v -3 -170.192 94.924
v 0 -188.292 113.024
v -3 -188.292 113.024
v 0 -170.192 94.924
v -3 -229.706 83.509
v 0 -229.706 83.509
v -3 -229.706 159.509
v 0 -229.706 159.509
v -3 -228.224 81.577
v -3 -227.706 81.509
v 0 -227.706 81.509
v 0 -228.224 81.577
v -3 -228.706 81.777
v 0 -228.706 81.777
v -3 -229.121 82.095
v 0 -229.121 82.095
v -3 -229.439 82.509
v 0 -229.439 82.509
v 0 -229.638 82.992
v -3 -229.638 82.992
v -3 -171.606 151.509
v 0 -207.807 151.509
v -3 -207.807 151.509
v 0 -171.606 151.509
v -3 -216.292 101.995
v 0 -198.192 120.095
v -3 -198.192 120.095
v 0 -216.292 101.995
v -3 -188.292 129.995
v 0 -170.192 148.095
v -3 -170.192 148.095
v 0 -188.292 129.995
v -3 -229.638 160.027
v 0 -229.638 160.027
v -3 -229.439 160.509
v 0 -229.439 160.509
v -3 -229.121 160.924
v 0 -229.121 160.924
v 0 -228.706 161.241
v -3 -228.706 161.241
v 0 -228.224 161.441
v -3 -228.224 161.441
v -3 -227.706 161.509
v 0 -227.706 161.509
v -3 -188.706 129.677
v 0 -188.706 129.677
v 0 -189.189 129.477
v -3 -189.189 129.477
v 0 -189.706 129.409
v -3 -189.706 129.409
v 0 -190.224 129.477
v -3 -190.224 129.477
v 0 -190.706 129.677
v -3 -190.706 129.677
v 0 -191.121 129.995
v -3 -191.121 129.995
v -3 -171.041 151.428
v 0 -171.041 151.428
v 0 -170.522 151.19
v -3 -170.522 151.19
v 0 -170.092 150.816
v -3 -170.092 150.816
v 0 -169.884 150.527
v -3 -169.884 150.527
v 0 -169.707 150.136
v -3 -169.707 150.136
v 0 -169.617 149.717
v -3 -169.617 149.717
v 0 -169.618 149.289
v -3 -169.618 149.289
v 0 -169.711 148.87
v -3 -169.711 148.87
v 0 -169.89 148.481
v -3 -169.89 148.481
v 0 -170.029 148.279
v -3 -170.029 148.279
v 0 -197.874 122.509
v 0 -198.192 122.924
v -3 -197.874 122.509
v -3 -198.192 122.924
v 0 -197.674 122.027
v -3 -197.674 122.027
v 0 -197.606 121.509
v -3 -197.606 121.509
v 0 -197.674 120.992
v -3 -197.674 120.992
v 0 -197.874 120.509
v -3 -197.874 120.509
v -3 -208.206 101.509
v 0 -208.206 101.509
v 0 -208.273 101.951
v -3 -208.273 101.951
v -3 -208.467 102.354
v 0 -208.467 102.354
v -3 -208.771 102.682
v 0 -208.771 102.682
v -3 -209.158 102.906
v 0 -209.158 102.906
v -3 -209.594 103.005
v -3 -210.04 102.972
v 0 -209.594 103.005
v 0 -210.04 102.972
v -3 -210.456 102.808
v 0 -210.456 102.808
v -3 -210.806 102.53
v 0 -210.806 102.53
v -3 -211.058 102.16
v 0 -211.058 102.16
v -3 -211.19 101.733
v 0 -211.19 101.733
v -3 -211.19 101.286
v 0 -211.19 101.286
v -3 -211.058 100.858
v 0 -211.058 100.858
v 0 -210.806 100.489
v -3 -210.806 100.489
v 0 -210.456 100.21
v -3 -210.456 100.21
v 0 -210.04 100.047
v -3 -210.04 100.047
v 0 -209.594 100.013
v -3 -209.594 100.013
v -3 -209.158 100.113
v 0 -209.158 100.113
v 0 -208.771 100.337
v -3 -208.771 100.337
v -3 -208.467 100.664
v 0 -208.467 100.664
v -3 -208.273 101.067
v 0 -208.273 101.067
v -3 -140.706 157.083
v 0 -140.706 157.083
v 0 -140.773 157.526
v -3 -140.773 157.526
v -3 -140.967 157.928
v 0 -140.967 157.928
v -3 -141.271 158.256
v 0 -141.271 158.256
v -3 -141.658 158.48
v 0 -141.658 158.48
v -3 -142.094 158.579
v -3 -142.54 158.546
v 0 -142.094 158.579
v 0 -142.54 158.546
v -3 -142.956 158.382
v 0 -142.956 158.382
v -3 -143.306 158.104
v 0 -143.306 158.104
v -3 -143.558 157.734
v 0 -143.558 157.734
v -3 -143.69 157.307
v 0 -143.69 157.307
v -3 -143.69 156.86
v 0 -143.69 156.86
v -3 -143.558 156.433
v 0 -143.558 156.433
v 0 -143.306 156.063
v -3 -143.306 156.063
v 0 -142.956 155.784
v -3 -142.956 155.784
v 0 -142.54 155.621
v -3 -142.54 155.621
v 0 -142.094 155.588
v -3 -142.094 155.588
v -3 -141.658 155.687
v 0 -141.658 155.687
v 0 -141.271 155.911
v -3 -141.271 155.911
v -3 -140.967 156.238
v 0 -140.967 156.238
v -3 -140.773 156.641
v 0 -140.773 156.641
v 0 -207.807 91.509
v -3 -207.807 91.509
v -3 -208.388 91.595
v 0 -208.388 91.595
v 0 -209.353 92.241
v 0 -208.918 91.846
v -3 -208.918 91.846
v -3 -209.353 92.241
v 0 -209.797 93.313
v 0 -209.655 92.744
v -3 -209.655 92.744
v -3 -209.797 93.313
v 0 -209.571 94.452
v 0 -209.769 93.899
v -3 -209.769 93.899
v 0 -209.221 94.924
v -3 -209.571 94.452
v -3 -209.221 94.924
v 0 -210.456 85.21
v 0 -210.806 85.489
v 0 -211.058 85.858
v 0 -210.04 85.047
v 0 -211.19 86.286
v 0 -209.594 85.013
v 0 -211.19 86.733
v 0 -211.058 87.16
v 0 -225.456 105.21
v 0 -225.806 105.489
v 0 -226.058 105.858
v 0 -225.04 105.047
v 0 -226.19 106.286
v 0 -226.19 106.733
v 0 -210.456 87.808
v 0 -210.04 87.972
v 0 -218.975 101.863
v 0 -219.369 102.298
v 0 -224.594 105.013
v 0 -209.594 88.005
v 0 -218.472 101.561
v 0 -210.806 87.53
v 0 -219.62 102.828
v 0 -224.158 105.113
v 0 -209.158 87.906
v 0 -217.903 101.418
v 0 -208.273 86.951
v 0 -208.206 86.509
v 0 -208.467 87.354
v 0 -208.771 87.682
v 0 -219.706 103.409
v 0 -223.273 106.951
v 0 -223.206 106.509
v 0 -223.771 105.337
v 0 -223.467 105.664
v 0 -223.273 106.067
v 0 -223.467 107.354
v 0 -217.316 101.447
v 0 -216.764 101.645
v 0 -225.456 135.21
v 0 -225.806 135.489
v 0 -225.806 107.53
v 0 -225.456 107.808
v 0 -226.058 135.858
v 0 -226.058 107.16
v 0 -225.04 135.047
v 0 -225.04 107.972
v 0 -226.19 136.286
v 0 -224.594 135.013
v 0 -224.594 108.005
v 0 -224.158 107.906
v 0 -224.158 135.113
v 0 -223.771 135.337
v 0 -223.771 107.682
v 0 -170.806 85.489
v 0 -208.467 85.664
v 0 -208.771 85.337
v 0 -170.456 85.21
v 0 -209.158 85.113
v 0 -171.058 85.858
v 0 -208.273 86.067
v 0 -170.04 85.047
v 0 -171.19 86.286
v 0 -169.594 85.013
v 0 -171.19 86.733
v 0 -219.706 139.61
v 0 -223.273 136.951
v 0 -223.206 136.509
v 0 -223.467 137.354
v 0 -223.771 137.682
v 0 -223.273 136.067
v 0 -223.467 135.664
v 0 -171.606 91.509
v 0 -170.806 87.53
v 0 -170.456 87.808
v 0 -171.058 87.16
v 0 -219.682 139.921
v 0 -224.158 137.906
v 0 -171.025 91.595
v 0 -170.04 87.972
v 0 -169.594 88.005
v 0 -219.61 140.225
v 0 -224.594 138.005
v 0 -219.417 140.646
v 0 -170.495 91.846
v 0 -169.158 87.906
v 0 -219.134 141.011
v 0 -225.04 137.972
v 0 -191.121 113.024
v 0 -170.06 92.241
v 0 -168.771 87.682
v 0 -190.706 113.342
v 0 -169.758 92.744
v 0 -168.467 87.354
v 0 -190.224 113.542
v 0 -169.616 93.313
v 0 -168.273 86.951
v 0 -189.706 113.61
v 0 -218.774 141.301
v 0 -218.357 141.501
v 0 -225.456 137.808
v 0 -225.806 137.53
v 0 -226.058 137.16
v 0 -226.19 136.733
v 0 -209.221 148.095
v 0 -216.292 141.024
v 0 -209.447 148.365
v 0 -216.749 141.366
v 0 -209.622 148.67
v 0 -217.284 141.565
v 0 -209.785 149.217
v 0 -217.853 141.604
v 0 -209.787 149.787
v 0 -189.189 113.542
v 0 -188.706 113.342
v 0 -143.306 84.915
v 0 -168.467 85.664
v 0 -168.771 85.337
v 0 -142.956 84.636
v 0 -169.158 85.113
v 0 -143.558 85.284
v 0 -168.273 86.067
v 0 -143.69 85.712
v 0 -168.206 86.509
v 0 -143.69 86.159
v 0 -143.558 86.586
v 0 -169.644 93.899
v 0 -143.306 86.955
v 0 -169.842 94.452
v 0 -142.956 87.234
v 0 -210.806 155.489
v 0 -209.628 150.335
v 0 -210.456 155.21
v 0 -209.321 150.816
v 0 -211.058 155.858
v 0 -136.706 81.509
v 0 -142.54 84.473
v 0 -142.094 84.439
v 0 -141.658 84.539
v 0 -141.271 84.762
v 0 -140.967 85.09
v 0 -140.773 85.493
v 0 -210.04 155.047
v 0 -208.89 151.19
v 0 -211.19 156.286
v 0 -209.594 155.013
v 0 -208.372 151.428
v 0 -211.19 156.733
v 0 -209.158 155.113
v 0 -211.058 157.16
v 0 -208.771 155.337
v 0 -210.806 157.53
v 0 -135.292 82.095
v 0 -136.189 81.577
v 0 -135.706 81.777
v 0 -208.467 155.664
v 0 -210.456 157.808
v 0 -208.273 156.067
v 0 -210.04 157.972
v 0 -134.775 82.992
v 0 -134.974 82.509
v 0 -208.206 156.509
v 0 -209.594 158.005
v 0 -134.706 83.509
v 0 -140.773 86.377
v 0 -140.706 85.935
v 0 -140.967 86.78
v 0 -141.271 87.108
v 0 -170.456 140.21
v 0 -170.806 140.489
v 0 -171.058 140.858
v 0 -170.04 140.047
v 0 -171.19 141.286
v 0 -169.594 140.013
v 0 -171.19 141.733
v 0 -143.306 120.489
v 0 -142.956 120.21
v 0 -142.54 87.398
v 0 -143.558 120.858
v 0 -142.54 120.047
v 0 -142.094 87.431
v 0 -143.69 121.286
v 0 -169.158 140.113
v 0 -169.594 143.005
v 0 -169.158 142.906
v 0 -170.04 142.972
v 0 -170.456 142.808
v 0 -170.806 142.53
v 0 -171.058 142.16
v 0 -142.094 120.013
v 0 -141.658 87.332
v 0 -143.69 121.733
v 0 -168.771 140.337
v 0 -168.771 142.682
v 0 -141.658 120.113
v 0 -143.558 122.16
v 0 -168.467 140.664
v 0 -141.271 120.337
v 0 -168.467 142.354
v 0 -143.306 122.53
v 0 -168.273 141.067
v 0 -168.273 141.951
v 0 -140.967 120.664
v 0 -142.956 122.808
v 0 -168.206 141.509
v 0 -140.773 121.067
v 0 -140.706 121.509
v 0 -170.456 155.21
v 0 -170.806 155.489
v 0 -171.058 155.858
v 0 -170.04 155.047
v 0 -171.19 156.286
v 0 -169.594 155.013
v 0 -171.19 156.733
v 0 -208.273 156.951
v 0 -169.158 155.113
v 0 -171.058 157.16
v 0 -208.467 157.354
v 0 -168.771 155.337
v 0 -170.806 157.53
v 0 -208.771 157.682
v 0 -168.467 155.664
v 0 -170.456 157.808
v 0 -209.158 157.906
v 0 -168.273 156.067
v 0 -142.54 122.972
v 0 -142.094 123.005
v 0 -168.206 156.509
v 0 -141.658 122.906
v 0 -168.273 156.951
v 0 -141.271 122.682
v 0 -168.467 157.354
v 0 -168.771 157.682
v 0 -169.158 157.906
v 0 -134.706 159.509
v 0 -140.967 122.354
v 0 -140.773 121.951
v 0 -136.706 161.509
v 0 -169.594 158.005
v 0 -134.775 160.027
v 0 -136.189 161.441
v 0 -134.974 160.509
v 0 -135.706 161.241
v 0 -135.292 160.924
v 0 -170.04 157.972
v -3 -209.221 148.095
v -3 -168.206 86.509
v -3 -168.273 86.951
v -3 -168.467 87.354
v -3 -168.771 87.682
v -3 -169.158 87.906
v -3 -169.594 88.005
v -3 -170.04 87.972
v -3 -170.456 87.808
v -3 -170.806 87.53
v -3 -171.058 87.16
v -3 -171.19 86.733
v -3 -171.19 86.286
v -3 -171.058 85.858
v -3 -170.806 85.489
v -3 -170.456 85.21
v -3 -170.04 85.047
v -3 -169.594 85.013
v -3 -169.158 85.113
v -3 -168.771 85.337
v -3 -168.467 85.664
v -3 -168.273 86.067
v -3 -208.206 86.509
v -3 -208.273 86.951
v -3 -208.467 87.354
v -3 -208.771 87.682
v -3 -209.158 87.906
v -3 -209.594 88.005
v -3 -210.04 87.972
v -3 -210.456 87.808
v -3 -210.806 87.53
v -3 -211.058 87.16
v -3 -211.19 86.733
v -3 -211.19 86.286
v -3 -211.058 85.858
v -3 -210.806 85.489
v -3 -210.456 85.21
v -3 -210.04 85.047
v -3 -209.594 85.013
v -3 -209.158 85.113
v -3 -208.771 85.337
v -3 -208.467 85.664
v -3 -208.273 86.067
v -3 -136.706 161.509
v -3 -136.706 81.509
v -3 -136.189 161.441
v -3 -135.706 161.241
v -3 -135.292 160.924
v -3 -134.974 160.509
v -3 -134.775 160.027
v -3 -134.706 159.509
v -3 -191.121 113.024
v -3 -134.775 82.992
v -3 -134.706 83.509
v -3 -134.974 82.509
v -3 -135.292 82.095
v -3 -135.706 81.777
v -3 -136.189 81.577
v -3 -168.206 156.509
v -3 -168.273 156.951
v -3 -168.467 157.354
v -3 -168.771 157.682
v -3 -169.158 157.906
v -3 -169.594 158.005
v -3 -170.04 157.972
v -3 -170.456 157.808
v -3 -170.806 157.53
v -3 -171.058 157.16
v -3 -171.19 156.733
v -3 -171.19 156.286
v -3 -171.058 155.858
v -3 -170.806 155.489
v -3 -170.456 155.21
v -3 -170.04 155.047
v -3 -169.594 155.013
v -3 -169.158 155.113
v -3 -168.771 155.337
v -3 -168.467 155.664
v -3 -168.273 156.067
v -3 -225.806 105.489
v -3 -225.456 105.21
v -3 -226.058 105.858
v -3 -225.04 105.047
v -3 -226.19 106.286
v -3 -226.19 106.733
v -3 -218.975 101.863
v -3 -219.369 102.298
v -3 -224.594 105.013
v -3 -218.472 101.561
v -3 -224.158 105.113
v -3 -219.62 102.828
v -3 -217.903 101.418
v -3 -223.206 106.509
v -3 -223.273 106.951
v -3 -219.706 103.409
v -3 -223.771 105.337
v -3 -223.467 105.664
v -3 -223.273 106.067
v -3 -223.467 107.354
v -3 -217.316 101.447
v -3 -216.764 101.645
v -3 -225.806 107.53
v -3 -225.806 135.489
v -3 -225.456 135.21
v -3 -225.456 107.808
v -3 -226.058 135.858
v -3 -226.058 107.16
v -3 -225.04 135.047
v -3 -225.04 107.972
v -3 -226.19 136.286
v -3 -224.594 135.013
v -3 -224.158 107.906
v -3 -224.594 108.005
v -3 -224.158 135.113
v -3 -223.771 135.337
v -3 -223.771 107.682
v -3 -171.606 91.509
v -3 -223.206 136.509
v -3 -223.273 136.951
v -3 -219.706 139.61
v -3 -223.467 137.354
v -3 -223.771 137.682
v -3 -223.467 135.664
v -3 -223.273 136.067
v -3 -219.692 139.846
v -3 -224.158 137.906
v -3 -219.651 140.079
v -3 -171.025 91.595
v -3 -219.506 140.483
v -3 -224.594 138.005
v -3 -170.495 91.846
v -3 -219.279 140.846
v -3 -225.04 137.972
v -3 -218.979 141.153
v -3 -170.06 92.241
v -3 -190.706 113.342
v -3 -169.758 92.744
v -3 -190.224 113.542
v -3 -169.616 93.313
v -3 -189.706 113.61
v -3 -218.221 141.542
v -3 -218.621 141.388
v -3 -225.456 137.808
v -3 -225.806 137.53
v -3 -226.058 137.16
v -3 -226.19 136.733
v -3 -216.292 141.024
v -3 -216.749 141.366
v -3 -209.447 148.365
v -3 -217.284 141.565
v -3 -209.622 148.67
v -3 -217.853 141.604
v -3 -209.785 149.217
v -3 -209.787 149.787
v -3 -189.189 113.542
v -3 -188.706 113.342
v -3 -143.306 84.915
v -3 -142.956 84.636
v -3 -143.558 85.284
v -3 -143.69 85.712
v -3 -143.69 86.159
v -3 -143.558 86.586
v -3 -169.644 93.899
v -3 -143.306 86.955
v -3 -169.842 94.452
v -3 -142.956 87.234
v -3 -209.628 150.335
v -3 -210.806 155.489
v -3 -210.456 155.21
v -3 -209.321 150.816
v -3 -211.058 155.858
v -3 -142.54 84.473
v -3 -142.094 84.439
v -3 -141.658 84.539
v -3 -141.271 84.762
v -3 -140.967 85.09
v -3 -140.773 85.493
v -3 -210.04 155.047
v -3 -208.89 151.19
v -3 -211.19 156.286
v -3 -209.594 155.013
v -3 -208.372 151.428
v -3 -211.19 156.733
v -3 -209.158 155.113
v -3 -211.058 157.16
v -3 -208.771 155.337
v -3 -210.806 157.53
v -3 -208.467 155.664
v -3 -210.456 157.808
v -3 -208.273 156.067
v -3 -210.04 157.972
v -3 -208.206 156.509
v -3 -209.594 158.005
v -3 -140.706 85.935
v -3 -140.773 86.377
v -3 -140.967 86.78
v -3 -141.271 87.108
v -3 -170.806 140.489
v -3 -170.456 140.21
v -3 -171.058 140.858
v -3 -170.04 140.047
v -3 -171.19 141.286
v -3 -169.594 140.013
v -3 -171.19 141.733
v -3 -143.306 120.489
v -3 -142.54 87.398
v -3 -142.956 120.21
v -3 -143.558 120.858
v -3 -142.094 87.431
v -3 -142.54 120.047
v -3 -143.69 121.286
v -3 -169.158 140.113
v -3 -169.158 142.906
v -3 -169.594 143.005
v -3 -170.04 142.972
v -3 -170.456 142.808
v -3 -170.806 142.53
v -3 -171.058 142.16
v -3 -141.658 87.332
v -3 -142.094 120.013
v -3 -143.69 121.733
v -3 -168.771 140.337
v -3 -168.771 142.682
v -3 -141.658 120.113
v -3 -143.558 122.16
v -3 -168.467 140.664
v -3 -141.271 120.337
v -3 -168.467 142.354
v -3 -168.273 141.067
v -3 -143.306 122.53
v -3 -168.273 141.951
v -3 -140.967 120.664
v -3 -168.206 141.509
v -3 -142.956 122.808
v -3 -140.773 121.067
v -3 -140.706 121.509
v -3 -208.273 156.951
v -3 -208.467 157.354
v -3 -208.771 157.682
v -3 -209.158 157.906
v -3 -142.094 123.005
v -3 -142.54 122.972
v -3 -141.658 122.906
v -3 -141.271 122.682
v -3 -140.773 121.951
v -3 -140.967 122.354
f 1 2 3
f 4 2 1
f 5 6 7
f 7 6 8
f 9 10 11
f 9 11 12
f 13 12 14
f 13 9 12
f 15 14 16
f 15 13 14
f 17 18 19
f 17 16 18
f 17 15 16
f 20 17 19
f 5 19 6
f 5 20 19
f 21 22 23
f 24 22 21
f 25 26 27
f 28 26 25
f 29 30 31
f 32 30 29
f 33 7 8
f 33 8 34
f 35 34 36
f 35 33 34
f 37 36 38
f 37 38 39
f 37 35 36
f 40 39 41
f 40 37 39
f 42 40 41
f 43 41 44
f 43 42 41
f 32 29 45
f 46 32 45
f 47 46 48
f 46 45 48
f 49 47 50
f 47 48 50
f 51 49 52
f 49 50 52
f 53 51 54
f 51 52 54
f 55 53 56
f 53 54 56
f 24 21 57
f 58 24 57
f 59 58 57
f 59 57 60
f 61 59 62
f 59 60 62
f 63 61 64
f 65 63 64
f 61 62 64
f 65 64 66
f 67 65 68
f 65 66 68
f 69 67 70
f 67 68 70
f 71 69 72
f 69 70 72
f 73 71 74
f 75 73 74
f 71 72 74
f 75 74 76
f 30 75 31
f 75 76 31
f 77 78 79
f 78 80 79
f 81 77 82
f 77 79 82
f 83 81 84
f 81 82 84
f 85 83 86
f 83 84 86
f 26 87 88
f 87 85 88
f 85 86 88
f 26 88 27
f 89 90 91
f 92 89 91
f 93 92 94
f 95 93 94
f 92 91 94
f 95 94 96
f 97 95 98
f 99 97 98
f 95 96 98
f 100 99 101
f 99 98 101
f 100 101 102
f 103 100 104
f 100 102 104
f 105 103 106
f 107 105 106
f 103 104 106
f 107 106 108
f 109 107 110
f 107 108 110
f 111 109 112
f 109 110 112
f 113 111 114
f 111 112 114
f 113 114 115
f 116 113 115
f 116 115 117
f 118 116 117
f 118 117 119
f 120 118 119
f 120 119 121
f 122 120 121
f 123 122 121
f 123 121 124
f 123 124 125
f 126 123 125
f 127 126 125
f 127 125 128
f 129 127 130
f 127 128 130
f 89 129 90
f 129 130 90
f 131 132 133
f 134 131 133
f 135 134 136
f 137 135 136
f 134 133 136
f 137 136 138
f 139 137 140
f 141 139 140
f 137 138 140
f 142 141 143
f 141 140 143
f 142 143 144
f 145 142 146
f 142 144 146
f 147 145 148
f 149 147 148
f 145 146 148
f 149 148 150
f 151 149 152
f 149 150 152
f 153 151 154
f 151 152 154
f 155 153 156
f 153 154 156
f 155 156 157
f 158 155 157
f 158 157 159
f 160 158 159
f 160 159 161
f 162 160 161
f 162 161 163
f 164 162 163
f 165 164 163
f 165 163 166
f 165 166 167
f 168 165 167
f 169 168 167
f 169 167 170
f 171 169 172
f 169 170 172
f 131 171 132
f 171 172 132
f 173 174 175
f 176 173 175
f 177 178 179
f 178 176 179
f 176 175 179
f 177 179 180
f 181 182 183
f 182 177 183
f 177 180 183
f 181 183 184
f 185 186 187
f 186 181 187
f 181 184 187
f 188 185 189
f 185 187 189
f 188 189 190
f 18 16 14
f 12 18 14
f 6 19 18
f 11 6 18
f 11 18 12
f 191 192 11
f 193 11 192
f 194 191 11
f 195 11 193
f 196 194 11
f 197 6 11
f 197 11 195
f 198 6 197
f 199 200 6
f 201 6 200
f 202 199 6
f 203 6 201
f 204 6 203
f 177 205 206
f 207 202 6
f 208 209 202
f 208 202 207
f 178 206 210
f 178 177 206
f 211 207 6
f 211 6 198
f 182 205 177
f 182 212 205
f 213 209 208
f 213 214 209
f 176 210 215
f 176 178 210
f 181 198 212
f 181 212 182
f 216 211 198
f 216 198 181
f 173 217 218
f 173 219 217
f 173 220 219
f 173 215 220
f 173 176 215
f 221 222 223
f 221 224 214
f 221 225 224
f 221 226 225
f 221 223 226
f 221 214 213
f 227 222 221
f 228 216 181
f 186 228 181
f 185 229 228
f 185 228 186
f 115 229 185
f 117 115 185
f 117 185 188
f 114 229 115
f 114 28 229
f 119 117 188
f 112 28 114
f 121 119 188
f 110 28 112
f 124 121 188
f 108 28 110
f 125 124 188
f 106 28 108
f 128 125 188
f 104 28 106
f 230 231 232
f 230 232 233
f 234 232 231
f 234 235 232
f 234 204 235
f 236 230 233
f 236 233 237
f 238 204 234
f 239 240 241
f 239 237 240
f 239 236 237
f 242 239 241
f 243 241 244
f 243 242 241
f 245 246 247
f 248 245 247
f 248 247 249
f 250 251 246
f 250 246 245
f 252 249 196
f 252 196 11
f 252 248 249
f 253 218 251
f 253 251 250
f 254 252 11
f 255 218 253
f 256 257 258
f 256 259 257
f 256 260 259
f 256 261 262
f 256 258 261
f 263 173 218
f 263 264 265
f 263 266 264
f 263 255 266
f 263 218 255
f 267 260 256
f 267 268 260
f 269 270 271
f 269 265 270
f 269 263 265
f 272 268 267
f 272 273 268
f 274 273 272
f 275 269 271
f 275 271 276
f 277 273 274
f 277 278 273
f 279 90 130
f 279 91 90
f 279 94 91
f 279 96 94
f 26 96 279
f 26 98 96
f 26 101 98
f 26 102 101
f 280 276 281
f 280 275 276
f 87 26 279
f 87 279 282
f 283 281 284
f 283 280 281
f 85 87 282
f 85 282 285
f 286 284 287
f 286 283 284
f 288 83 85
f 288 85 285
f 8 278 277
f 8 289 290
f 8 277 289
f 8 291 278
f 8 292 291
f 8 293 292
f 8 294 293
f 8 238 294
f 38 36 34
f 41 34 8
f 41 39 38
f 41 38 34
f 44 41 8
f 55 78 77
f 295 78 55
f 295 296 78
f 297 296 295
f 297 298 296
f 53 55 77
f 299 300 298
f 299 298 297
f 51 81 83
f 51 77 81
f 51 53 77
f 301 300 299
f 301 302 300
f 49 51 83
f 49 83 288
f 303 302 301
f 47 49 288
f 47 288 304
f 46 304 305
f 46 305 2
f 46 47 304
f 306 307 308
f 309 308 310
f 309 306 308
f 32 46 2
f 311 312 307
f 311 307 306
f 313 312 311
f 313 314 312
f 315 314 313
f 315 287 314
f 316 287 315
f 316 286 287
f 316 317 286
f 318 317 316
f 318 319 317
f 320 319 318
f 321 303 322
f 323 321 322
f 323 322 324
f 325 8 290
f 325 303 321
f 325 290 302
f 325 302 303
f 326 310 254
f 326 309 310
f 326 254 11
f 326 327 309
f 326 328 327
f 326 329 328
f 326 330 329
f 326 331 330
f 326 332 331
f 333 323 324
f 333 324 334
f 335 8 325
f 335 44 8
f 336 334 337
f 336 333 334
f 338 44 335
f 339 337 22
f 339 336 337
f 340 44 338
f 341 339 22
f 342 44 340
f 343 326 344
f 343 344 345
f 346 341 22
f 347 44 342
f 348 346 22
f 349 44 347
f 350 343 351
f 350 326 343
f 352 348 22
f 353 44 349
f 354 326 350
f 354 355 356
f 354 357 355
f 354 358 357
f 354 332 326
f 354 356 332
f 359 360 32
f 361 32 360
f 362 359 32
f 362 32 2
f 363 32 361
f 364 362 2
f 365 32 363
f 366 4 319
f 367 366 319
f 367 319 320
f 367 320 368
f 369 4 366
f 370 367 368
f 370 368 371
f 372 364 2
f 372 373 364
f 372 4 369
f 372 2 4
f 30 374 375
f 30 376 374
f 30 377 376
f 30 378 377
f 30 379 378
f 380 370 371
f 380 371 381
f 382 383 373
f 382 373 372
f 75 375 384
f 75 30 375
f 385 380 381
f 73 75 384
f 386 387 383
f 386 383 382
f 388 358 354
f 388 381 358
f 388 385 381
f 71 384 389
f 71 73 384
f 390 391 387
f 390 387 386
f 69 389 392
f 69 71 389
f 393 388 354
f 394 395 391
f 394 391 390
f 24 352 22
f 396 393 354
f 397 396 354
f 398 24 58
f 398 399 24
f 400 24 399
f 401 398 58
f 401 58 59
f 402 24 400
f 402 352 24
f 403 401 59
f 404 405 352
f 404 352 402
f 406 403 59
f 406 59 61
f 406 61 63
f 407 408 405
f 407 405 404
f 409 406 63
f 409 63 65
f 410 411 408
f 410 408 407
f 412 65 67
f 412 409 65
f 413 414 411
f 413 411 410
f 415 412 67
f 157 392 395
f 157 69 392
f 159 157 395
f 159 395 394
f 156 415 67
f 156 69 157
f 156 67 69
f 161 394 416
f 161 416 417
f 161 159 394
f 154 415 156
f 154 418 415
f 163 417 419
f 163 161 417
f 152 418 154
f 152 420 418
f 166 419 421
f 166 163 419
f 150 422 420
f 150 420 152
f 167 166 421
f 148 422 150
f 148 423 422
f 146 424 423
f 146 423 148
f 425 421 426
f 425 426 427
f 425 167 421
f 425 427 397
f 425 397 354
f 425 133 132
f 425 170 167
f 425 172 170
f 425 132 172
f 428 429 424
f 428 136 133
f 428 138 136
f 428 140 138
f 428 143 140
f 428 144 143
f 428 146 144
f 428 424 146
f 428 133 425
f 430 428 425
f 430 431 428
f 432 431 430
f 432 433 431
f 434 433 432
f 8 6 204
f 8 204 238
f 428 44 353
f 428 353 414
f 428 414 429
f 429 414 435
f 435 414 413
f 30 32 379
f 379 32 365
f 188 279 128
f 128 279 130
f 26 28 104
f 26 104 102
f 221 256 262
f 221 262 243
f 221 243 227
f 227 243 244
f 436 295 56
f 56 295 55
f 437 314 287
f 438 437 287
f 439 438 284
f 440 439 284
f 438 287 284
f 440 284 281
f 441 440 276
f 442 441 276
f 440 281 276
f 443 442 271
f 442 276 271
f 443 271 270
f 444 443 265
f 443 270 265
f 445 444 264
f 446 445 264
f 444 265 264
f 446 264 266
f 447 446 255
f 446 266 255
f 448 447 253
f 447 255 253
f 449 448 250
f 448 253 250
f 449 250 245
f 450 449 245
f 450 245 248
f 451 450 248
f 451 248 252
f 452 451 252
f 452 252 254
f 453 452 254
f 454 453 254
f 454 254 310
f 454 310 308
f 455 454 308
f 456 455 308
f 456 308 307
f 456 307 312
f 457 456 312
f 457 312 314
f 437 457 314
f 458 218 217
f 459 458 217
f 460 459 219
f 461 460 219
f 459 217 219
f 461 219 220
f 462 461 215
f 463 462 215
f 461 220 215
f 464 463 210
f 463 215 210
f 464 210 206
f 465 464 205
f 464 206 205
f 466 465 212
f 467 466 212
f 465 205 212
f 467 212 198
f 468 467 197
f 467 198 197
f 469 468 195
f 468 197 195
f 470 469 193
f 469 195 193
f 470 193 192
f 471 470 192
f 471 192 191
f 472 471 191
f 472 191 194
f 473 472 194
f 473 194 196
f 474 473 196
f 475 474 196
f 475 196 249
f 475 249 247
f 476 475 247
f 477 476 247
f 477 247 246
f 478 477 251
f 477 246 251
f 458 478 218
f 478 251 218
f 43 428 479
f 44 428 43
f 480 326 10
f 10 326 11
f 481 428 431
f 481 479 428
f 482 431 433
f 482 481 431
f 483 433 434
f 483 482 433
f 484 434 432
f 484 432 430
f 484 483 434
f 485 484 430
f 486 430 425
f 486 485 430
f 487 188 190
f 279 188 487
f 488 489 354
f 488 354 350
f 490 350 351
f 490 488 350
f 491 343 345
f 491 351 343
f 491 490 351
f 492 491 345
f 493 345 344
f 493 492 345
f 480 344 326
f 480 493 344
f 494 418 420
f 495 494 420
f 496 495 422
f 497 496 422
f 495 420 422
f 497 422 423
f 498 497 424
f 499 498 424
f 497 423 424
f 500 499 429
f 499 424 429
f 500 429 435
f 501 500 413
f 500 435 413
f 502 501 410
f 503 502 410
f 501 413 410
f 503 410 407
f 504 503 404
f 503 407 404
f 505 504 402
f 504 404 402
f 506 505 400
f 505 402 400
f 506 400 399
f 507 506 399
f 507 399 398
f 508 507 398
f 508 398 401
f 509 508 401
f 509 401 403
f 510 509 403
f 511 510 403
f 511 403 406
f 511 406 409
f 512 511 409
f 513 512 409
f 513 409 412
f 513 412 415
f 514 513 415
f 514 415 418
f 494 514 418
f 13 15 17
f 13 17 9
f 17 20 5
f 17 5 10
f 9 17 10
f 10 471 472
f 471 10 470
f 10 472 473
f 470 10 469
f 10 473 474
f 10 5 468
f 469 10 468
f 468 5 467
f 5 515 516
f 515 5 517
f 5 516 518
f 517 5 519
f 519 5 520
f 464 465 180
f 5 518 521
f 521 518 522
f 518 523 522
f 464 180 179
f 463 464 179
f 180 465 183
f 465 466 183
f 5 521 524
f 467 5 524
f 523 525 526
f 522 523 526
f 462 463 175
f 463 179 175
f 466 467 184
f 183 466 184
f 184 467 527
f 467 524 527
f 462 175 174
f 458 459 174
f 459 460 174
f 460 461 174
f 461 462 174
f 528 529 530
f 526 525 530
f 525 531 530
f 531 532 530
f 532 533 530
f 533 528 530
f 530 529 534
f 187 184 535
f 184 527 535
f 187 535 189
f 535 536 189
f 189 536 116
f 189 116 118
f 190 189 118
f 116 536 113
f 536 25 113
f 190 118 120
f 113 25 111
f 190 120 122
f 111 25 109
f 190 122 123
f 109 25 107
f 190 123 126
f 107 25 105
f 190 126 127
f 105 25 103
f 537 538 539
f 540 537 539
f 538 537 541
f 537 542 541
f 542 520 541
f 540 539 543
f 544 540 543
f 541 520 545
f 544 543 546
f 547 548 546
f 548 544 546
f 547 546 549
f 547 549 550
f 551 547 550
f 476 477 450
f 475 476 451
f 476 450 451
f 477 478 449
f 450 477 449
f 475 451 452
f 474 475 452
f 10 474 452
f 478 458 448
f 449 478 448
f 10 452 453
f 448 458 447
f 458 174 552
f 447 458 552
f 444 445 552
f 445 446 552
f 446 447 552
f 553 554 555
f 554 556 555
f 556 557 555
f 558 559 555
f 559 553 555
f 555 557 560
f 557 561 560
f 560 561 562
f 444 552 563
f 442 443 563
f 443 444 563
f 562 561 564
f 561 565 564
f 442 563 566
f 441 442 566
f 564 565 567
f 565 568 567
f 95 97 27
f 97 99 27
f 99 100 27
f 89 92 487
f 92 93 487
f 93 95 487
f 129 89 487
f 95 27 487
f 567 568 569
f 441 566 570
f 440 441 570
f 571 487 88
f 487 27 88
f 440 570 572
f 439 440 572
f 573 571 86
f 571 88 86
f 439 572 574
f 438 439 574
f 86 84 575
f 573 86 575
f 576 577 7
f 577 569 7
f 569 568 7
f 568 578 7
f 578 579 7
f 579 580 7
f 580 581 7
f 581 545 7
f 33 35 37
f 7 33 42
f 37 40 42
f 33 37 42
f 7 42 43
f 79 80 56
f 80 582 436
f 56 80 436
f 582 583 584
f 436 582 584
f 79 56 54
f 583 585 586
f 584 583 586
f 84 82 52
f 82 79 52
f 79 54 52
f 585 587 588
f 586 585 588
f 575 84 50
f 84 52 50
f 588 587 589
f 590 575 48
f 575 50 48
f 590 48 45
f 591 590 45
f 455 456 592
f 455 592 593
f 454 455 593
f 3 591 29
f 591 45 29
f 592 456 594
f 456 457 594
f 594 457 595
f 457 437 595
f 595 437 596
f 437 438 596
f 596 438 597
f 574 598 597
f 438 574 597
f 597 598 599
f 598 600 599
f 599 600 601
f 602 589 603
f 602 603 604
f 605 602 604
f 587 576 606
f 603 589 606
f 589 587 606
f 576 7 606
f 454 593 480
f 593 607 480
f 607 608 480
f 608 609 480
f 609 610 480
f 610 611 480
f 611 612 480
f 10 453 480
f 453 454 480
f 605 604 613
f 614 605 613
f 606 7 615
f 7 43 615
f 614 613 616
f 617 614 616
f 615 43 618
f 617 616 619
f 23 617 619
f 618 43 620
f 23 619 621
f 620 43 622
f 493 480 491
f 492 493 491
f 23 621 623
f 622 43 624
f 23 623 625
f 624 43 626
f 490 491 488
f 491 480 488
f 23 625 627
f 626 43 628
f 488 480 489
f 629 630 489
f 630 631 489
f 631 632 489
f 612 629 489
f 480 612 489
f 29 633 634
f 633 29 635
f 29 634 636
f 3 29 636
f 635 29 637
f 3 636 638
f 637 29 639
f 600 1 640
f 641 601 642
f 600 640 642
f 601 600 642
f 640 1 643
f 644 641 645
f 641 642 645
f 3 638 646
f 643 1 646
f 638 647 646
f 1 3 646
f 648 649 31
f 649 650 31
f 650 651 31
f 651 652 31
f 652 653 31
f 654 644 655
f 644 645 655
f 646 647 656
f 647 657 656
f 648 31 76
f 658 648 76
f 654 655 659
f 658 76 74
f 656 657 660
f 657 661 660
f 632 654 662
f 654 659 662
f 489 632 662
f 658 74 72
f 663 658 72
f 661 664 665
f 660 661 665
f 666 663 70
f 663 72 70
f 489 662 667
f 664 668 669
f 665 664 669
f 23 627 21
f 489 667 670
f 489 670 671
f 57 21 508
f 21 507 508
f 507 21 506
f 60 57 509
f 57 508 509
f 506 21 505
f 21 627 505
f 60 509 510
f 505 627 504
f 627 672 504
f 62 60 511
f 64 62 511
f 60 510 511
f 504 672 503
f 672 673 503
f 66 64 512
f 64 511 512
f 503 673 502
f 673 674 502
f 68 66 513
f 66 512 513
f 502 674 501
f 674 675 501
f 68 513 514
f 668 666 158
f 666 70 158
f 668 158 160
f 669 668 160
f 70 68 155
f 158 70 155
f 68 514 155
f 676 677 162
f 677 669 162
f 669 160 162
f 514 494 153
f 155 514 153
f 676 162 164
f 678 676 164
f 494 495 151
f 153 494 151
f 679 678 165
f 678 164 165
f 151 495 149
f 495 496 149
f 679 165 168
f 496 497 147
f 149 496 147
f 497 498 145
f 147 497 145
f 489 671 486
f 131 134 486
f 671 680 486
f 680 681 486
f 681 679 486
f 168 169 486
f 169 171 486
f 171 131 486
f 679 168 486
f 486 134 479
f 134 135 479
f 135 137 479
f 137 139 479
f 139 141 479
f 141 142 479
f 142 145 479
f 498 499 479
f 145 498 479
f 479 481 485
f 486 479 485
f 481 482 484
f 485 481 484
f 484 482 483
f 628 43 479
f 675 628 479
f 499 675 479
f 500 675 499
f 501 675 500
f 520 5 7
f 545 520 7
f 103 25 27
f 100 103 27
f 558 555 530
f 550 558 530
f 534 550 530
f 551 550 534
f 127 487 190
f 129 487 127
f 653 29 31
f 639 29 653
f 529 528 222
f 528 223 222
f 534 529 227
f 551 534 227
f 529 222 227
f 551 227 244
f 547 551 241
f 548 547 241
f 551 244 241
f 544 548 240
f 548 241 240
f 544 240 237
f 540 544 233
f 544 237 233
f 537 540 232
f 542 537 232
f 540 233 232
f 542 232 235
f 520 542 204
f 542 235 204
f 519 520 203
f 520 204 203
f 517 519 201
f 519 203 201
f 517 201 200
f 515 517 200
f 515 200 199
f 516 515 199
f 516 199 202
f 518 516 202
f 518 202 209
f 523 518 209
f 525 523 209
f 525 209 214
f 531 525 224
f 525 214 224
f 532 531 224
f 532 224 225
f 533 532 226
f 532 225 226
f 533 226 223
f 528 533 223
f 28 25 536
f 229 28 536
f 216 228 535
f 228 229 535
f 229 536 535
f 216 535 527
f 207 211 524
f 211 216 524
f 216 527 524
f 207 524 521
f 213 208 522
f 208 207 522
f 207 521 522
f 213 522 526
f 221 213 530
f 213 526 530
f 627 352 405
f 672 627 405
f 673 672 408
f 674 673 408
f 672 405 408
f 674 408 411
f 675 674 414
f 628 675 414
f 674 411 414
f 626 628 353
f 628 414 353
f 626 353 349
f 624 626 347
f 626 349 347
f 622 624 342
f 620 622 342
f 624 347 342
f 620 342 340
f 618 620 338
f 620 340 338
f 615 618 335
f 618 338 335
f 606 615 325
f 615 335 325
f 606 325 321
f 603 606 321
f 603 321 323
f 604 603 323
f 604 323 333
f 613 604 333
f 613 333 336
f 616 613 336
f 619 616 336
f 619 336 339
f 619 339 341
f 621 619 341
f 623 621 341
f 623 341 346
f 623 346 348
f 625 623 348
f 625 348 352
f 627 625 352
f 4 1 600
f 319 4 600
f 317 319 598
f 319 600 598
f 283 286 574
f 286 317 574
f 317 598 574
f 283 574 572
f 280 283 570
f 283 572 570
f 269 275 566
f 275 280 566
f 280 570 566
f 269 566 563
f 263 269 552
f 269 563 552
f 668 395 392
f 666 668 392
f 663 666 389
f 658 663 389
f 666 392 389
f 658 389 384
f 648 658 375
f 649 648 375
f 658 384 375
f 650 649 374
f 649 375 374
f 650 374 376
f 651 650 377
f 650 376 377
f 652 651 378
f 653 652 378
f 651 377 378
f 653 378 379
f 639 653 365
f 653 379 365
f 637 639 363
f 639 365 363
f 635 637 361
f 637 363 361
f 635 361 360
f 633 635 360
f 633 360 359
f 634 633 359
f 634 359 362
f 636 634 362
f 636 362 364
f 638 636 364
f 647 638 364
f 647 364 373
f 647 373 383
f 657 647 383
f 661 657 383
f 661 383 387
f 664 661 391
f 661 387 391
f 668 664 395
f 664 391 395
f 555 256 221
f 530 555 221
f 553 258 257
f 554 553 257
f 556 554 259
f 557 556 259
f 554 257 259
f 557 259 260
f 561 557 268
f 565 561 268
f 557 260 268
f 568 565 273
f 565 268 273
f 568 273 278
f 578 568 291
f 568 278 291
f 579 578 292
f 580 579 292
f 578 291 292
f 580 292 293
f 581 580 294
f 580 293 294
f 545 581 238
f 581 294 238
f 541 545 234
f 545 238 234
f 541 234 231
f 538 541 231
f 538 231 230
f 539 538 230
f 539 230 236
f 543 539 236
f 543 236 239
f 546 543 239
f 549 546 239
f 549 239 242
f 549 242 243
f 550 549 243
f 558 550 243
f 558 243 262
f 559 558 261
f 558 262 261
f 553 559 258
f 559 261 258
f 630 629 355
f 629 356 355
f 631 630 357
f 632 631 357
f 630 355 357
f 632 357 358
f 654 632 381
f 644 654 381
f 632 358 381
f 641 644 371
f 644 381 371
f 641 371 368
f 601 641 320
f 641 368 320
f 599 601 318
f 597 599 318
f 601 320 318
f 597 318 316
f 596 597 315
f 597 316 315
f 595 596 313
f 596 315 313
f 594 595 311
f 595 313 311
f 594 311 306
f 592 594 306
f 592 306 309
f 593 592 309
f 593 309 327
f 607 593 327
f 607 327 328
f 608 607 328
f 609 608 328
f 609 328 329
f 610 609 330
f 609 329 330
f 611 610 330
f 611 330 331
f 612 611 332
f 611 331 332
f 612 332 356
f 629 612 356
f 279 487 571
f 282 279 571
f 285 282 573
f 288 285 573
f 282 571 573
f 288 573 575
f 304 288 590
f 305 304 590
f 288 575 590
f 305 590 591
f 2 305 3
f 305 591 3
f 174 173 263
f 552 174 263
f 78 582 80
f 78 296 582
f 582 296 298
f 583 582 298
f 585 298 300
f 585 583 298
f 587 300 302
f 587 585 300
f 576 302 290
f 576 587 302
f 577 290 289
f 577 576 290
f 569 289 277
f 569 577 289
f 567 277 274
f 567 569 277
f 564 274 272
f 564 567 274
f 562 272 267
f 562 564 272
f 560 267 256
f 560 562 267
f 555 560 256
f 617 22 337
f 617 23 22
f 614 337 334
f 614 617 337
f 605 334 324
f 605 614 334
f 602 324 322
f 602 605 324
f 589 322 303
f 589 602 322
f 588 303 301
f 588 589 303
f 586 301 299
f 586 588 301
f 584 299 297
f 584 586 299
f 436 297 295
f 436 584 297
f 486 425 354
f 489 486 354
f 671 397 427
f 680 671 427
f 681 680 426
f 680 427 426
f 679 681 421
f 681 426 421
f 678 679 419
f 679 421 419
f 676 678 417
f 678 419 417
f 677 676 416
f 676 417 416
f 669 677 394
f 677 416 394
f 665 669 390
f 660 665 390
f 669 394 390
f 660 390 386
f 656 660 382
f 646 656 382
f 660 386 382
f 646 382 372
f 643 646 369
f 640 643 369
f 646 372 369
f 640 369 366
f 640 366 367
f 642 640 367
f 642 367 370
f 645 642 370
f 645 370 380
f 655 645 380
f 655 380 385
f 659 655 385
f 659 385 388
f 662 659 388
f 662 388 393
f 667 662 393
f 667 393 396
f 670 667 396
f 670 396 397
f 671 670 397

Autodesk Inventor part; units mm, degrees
ref_plane "YZ Plane" through (0, 0, 0) normal (1, 0, 0) x (0, 1, 0)
ref_plane "XZ Plane" through (0, 0, 0) normal (0, 1, 0) x (-1, 0, 0)
ref_plane "XY Plane" through (0, 0, 0) normal (0, 0, 1) x (1, 0, 0)
sketch "スケッチ1" plane through (0, 0, 0) normal (1, 0, 0) x (0, 1, 0)
  line L0 (-149.7065, 436.5093) -> (480.2935, 436.5093)
  line L1 (480.2935, 436.5093) -> (480.2935, -193.4907)
  line L2 (480.2935, -193.4907) -> (-149.7065, -193.4907)
  line L3 (-149.7065, -193.4907) -> (-149.7065, 436.5093)
  line L4 (-149.7065, 436.5093) -> (480.2935, -193.4907) construction
  line L5 (480.2935, 436.5093) -> (-149.7065, -193.4907) construction
  line L6 (-149.7065, 343.7276) -> (-134.7065, 343.7276)
  line L7 (-134.7065, 343.7276) -> (-134.7065, -100.7089)
  line L8 (-134.7065, -100.7089) -> (-149.7065, -100.7089)
  line L9 (-149.7065, -100.7089) -> (-149.7065, 343.7276)
  line L10 (387.5118, 436.5093) -> (-56.9247, 436.5093)
  line L11 (-56.9247, 436.5093) -> (-56.9247, 421.5093)
  line L12 (-56.9247, 421.5093) -> (387.5118, 421.5093)
  line L13 (387.5118, 421.5093) -> (387.5118, 436.5093)
  line L14 (-56.9247, 421.5093) -> (-134.7065, 343.7276)
  line L15 (-134.7065, 343.7276) -> (-134.7065, 436.5093)
  line L16 (-56.9247, 421.5093) -> (-134.7065, 343.7276)
  line L17 (-134.7065, 343.7276) -> (-127.6354, 336.6565)
  line L18 (-127.6354, 336.6565) -> (-49.8537, 414.4382)
  line L19 (-49.8537, 414.4382) -> (-56.9247, 421.5093)
  line L20 (54.5012, 421.5093) -> (-134.7065, 232.3017)
  line L21 (54.5012, 421.5093) -> (-134.7065, 232.3017)
  line L22 (-134.7065, 232.3017) -> (-127.6354, 225.2306)
  line L23 (-127.6354, 225.2306) -> (61.5722, 414.4382)
  line L24 (61.5722, 414.4382) -> (54.5012, 421.5093)
  line L25 (165.2935, 121.5093) -> (-791.3038, 121.5093)
  line L26 (-56.9247, -178.4907) -> (-134.7065, -100.7089)
  line L27 (-134.7065, -100.7089) -> (-127.6354, -93.6379)
  line L28 (-127.6354, -93.6379) -> (-49.8537, -171.4196)
  line L29 (-49.8537, -171.4196) -> (-56.9247, -178.4907)
  line L30 (54.5012, -178.4907) -> (-134.7065, 10.7169)
  line L31 (-134.7065, 10.7169) -> (-127.6354, 17.788)
  line L32 (-127.6354, 17.788) -> (61.5722, -171.4196)
  line L33 (61.5722, -171.4196) -> (54.5012, -178.4907)
  circle A0 centre (165.2935, 121.5093) radius 400
  line L34 (-164.7065, 146.5093) -> (-214.7065, 146.5093)
  line L35 (-214.7065, 146.5093) -> (-214.7065, 96.5093)
  line L36 (-214.7065, 96.5093) -> (-164.7065, 96.5093)
  line L37 (-164.7065, 96.5093) -> (-164.7065, 146.5093)
  line L38 (165.2935, 121.5093) -> (165.2935, -509.4085)
  line L39 (387.5118, 421.5093) -> (465.2935, 343.7276)
  line L40 (465.2935, 343.7276) -> (458.2225, 336.6565)
  line L41 (458.2225, 336.6565) -> (380.4407, 414.4382)
  line L42 (380.4407, 414.4382) -> (387.5118, 421.5093)
  line L43 (276.0859, 421.5093) -> (465.2935, 232.3017)
  line L44 (465.2935, 232.3017) -> (458.2225, 225.2306)
  line L45 (458.2225, 225.2306) -> (269.0148, 414.4382)
  line L46 (269.0148, 414.4382) -> (276.0859, 421.5093)
  line L47 (458.2225, 17.788) -> (269.0148, -171.4196)
  line L48 (465.2935, 10.7169) -> (458.2225, 17.788)
  line L49 (276.0859, -178.4907) -> (465.2935, 10.7169)
  line L50 (269.0148, -171.4196) -> (276.0859, -178.4907)
  line L51 (465.2935, -100.7089) -> (458.2225, -93.6379)
  line L52 (387.5118, -178.4907) -> (465.2935, -100.7089)
  line L53 (458.2225, -93.6379) -> (380.4407, -171.4196)
  line L54 (380.4407, -171.4196) -> (387.5118, -178.4907)
  line L55 (-149.7065, 161.5093) -> (-229.7065, 161.5093)
  line L56 (-229.7065, 161.5093) -> (-229.7065, 151.5093)
  line L57 (-229.7065, 151.5093) -> (-149.7065, 151.5093)
  line L58 (-149.7065, 151.5093) -> (-149.7065, 161.5093)
  line L59 (-229.7065, 151.5093) -> (-219.7065, 151.5093)
  line L60 (-219.7065, 151.5093) -> (-219.7065, 121.5093)
  line L61 (-219.7065, 121.5093) -> (-229.7065, 121.5093)
  line L62 (-229.7065, 121.5093) -> (-229.7065, 151.5093)
  line L63 (465.2935, 343.7276) -> (480.2935, 343.7276)
  line L64 (480.2935, 343.7276) -> (480.2935, -100.7089)
  line L65 (480.2935, -100.7089) -> (465.2935, -100.7089)
  line L66 (465.2935, -100.7089) -> (465.2935, 343.7276)
  line L67 (-56.9247, -193.4907) -> (387.5118, -193.4907)
  line L68 (387.5118, -193.4907) -> (387.5118, -178.4907)
  line L69 (387.5118, -178.4907) -> (-56.9247, -178.4907)
  line L70 (-56.9247, -178.4907) -> (-56.9247, -193.4907)
  line L71 (379.7941, 410.2561) -> (454.0403, 336.0099)
  line L72 (454.0403, 336.0099) -> (419.2302, 301.1998)
  line L73 (419.2302, 301.1998) -> (344.984, 375.446)
  line L74 (344.984, 375.446) -> (379.7941, 410.2561)
  line L75 (480.2935, 436.5093) -> (165.2935, 121.5093)
  line L76 (480.2935, 266.5093) -> (-149.7065, 266.5093)
  line L77 (-149.7065, 266.5093) -> (-149.7065, 246.5093)
  line L78 (-149.7065, 246.5093) -> (480.2935, 246.5093)
  line L79 (480.2935, 246.5093) -> (480.2935, 266.5093)
  line L80 (480.2935, -23.4907) -> (-149.7065, -23.4907)
  line L81 (-149.7065, -3.4907) -> (480.2935, -3.4907)
  line L82 (480.2935, 266.5093) -> (500.2935, 266.5093)
  line L83 (500.2935, 266.5093) -> (500.2935, 286.5093)
  line L84 (500.2935, 286.5093) -> (480.2935, 286.5093)
  line L85 (480.2935, 286.5093) -> (480.2935, 266.5093)
  line L86 (480.2935, -23.4907) -> (500.2935, -23.4907)
  line L87 (500.2935, -23.4907) -> (500.2935, -43.4907)
  line L88 (500.2935, -43.4907) -> (480.2935, -43.4907)
  line L89 (480.2935, -43.4907) -> (480.2935, -23.4907)
  line L90 (500.2935, 286.5093) -> (512.7935, 286.5093)
  line L91 (505.7289, -43.4907) -> (495.7289, -43.4907)
  circle A1 centre (677.2935, 121.5093) radius 122.5
  line L92 (480.2935, 266.5093) -> (500.2935, 266.5093)
  line L93 (500.2935, 266.5093) -> (500.2935, 246.5093)
  line L94 (500.2935, 246.5093) -> (480.2935, 246.5093)
  line L95 (480.2935, 246.5093) -> (480.2935, 266.5093)
  line L96 (480.2935, -23.4907) -> (500.2935, -23.4907)
  line L97 (500.2935, -23.4907) -> (500.2935, -3.4907)
  line L98 (500.2935, -3.4907) -> (480.2935, -3.4907)
  line L99 (480.2935, -3.4907) -> (480.2935, -23.4907)
  line L100 (291.2935, 266.5093) -> (311.2935, 266.5093)
  line L101 (311.2935, 266.5093) -> (311.2935, 286.5093)
  line L102 (311.2935, 286.5093) -> (291.2935, 286.5093)
  line L103 (291.2935, 286.5093) -> (291.2935, 266.5093)
  line L104 (-127.6354, 336.6565) -> (-149.7065, 336.6565)
  circle A2 centre (-142.2065, 353.5093) radius 1.5
  circle A3 centre (-142.2065, 343.5093) radius 1.5
  line L105 (-134.7065, 363.5093) -> (-149.7065, 363.5093)
  line L106 (-56.9247, 429.0093) -> (-142.2065, 429.0093)
  line L107 (-142.2065, 429.0093) -> (-142.2065, 363.5093)
  circle A4 centre (-66.7065, 429.0093) radius 1.5
  circle A5 centre (-56.7065, 429.0093) radius 1.5
  line L108 (-76.7065, 436.5093) -> (-76.7065, 421.5093)
  line L109 (-56.9247, 421.5093) -> (-76.7065, 421.5093)
  circle A6 centre (-66.7065, -185.9907) radius 1.5
  circle A7 centre (-56.7065, -185.9907) radius 1.5
  circle A8 centre (-142.2065, -110.4907) radius 1.5
  circle A9 centre (-142.2065, -100.4907) radius 1.5
  line L110 (-134.7065, -120.4907) -> (-149.7065, -120.4907)
  line L111 (-76.7065, -193.4907) -> (-76.7065, -178.4907)
  line L112 (407.2935, 436.5093) -> (407.2935, 421.5093)
  circle A10 centre (397.2935, 429.0093) radius 1.5
  circle A11 centre (387.2935, 429.0093) radius 1.5
  line L113 (465.2935, 363.5093) -> (480.2935, 363.5093)
  circle A12 centre (472.7935, 353.5093) radius 1.5
  circle A13 centre (472.7935, 343.5093) radius 1.5
  line L114 (465.2935, -120.4907) -> (480.2935, -120.4907)
  circle A14 centre (472.7935, -110.4907) radius 1.5
  circle A15 centre (472.7935, -100.4907) radius 1.5
  line L115 (407.2935, -193.4907) -> (407.2935, -178.4907)
  circle A16 centre (397.2935, -185.9907) radius 1.5
  circle A17 centre (387.2935, -185.9907) radius 1.5
  line L116 (-134.7065, -100.7089) -> (-134.7065, -120.4907)
  line L117 (-56.9247, -178.4907) -> (-76.7065, -178.4907)
  line L118 (407.2935, -178.4907) -> (387.5118, -178.4907)
  line L119 (465.2935, -100.7089) -> (465.2935, -120.4907)
  line L120 (465.2935, 363.5093) -> (465.2935, 343.7276)
  line L121 (387.5118, 421.5093) -> (407.2935, 421.5093)
  circle A18 centre (-127.6354, 343.7276) radius 1.5
  circle A19 centre (-120.5643, 350.7986) radius 1.5
  circle A20 centre (-127.6354, 232.3017) radius 1.5
  circle A21 centre (-120.5643, 239.3728) radius 1.5
  circle A22 centre (-63.9958, 407.3672) radius 1.5
  circle A23 centre (-56.9247, 414.4382) radius 1.5
  circle A24 centre (47.4301, 407.3672) radius 1.5
  circle A25 centre (54.5012, 414.4382) radius 1.5
  circle A26 centre (-56.9247, -171.4196) radius 1.5
  circle A27 centre (-63.9958, -164.3485) radius 1.5
  circle A28 centre (54.5012, -171.4196) radius 1.5
  circle A29 centre (47.4301, -164.3485) radius 1.5
  circle A30 centre (-127.6354, -100.7089) radius 1.5
  circle A31 centre (-120.5643, -107.78) radius 1.5
  circle A32 centre (-120.5643, 3.6459) radius 1.5
  circle A33 centre (-127.6354, 10.7169) radius 1.5
  circle A34 centre (458.2225, 10.7169) radius 1.5
  circle A35 centre (451.1514, 3.6459) radius 1.5
  circle A36 centre (458.2225, -100.7089) radius 1.5
  circle A37 centre (451.1514, -107.78) radius 1.5
  circle A38 centre (394.5828, -164.3485) radius 1.5
  circle A39 centre (387.5118, -171.4196) radius 1.5
  circle A40 centre (283.157, -164.3485) radius 1.5
  circle A41 centre (276.0859, -171.4196) radius 1.5
  circle A42 centre (451.1514, 239.3728) radius 1.5
  circle A43 centre (458.2225, 232.3017) radius 1.5
  circle A44 centre (458.2225, 343.7276) radius 1.5
  circle A45 centre (451.1514, 350.7986) radius 1.5
  circle A46 centre (394.5828, 407.3672) radius 1.5
  circle A47 centre (387.5118, 414.4382) radius 1.5
  circle A48 centre (276.0859, 414.4382) radius 1.5
  circle A49 centre (283.157, 407.3672) radius 1.5
  circle A50 centre (-142.2065, 232.0834) radius 1.5
  circle A51 centre (-142.2065, 242.0834) radius 1.5
  circle A52 centre (44.7194, 429.0093) radius 1.5
  circle A53 centre (54.7194, 429.0093) radius 1.5
  circle A54 centre (-142.2065, 10.9352) radius 1.5
  circle A55 centre (-142.2065, 0.9352) radius 1.5
  circle A56 centre (44.7194, -185.9907) radius 1.5
  circle A57 centre (54.7194, -185.9907) radius 1.5
  circle A58 centre (275.8676, 429.0093) radius 1.5
  circle A59 centre (285.8676, 429.0093) radius 1.5
  circle A60 centre (472.7935, 242.0834) radius 1.5
  circle A61 centre (472.7935, 232.0834) radius 1.5
  circle A62 centre (472.7935, 0.9352) radius 1.5
  circle A63 centre (472.7935, 10.9352) radius 1.5
  circle A64 centre (285.8676, -185.9907) radius 1.5
  circle A65 centre (275.8676, -185.9907) radius 1.5
  circle A66 centre (472.7935, 256.5093) radius 1.5
  circle A67 centre (472.7935, -13.4907) radius 1.5
  circle A68 centre (-142.2065, -13.4907) radius 1.5
  circle A69 centre (-142.2065, 256.5093) radius 1.5
  circle A70 centre (316.2935, 256.5093) radius 1.5
  circle A71 centre (316.2935, -13.4907) radius 1.5
  circle A72 centre (-209.7065, 141.5093) radius 1.5
  line L122 (-189.7065, 146.5093) -> (-189.7065, 96.5093)
  circle A73 centre (-209.7065, 101.5093) radius 1.5
  circle A74 centre (-169.7065, 141.5093) radius 1.5
  circle A75 centre (-169.7065, 101.5093) radius 1.5
  circle A76 centre (-142.2065, 121.5093) radius 1.5
  circle A77 centre (-142.2065, 157.0834) radius 1.5
  circle A78 centre (-169.7065, 156.5093) radius 1.5
  circle A79 centre (-209.7065, 156.5093) radius 1.5
  circle A80 centre (-224.7065, 136.5093) radius 1.5
  circle A81 centre (-224.7065, 106.5093) radius 1.5
  line L123 (-229.7065, 121.5093) -> (-229.7065, 91.5093)
  line L124 (-229.7065, 91.5093) -> (-149.7065, 91.5093)
  line L125 (-219.7065, 91.5093) -> (-219.7065, 121.5093)
  line L126 (-149.7065, 81.5093) -> (-229.7065, 81.5093)
  line L127 (-229.7065, 81.5093) -> (-229.7065, 91.5093)
  circle A82 centre (-209.7065, 86.5093) radius 1.5
  circle A83 centre (-169.7065, 86.5093) radius 1.5
  circle A84 centre (-142.2065, 85.9352) radius 1.5
  circle A85 centre (-189.7065, 121.5093) radius 10
  line L128 (-214.7065, 146.5093) -> (-189.7065, 121.5093)
  line L129 (-218.242, 142.9738) -> (-193.242, 117.9738)
  line L130 (-218.242, 142.9738) -> (-219.7065, 144.4382)
  line L131 (-211.1709, 150.0449) -> (-186.1709, 125.0449)
  line L132 (-211.1709, 150.0449) -> (-212.6354, 151.5093)
  line L133 (-211.1709, 92.9738) -> (-186.1709, 117.9738)
  line L134 (-218.242, 100.0449) -> (-193.242, 125.0449)
  line L135 (-168.242, 150.0449) -> (-193.242, 125.0449)
  line L136 (-168.242, 92.9738) -> (-193.242, 117.9738)
  line L137 (-218.242, 100.0449) -> (-219.7065, 98.5804)
  line L138 (-211.1709, 92.9738) -> (-212.6354, 91.5093)
  line L139 (-168.242, 150.0449) -> (-166.7775, 151.5093)
  line L140 (-168.242, 92.9738) -> (-166.7775, 91.5093)
  line L141 (-149.7065, 161.5093) -> (-134.7065, 161.5093)
  line L142 (-149.7065, 81.5093) -> (-134.7065, 81.5093)
  point P0 (0, 0)
  point P1 (-149.7065, -23.4907)
  point P2 (480.2935, -3.4907)
  point P3 (-149.7065, 266.5093)
  point P4 (480.2935, 246.5093)
  point P5 (-199.3657, 124.0975)
  point P6 (-199.3657, 118.9211)
  point P7 (-192.2947, 111.8501)
  point P8 (-187.1183, 111.8501)
  point P9 (-189.7065, 128.5804)
  point P10 (-189.7065, 114.4382)
  point P11 (-196.7775, 121.5093)
  dimension "d0" = 3
  dimension "d1" = 68
  dimension "d2" = 7.5
  dimension "d3" = 3
  dimension "d4" = 10
  dimension "d5" = 7.5
  dimension "d6" = 10
  dimension "d7" = 3
  dimension "d8" = 3
  dimension "d9" = 10
  dimension "d10" = 68
  dimension "d11" = 7.5
  dimension "d12" = 7.5
  dimension "d13" = 10
  dimension "d14" = 3
  dimension "d15" = 3
  dimension "d16" = 5
  dimension "d17" = 10
  dimension "d18" = 5
  dimension "d19" = 5
  dimension "d20" = 3
  dimension "d21" = 3
  dimension "d22" = 5
  dimension "d23" = 10
  dimension "d24" = 5
  dimension "d25" = 5
  dimension "d26" = 0.2182
  dimension "d27" = 3
  dimension "d28" = 7.5
  dimension "d29" = 0.2182
  dimension "d30" = 3
  dimension "d31" = 10
  dimension "d32" = 7.5
  dimension "d33" = 3
  dimension "d34" = 7.5
  dimension "d35" = 10
  dimension "d36" = 3
  dimension "d37" = 5
  dimension "d38" = 10
  dimension "d39" = 3
  dimension "d40" = 5
  dimension "d41" = 5
  dimension "d42" = 3
  dimension "d43" = 3
  dimension "d44" = 7.5
  dimension "d45" = 7.5
  dimension "d46" = 75
  dimension "d47" = 3
  dimension "d48" = 3
  dimension "d49" = 5
  dimension "d50" = 5
  dimension "d51" = 20
  dimension "d52" = 20
  dimension "d53" = 3
  dimension "d54" = 15
  dimension "d55" = 5
  dimension "d56" = 20
  dimension "d57" = 5
  dimension "d58" = 5
extrude "押し出し1" add sketch "スケッチ1" against normal blind 3 contours L62 L57 L60 L25 | L25 L125 L124 L123 | L56 L55 L3 L57 | L124 L3 L126 L127 | L60 L57 L132 L131 L34 L35 L129 L130 | L137 L134 L35 L36 L133 L138 L124 L125 | A85 L129 L25 | L25 L134 A85 | L35 L128 A72 A85 L129 | L134 A85 L133 L36 L35 | L141 L7 L25 A76 L3 | L3 L25 A76 L7 L142 | L134 L128 L25 | L25 L122 L136 L129 | L129 L136 L133 A85 L134 | L129 A85 L128 L134 | L34 L131 A85 L128 A72 | L3 L25 L37 L34 L135 L139 L57 | L140 L136 L36 L37 L25 L3 L124 | L122 L135 A85 L25 | L128 L135 L122 | L25 A85 L136 L122 | L128 A85 L131 L135 | L133 L122 A85 | L128 A72 | A72 L128 | A85 L135 L34 L37 L25 | L25 L37 L36 L136 A85 | L136 A85 L122 | A75
extrude "押し出し2" cut sketch "スケッチ1" against normal blind 3 contours A85 L129 L25 | L25 L134 A85 | L133 L122 A85 | L136 A85 L122
fillet "フィレット1" radius 2 13 edges at (-1.5, -229.7065, 161.5093) (-1.5, -229.7065, 81.5093) (-1.5, -196.7775, 121.5093) (-1.5, -219.7065, 144.4382) (-1.5, -219.7065, 98.5804) (-1.5, -189.7065, 114.4382) (-1.5, -166.7775, 91.5093) (-1.5, -212.6354, 91.5093) (-1.5, -166.7775, 151.5093) (-1.5, -189.7065, 128.5804) (-1.5, -212.6354, 151.5093) (-1.5, -134.7065, 161.5093) (-1.5, -134.7065, 81.5093)
equation "\"d5\" = d2"
equation "\"d12\" = d11"
equation "\"d19\" = d18"
equation "\"d25\" = d24"
equation "\"d29\" = d26"
equation "\"d32\" = d28"
equation "\"d45\" = d44"
equation "\"d50\" = d49"
properties part number "base_weel-v1-Plate-lider-F" material "アルミニウム 6061"
